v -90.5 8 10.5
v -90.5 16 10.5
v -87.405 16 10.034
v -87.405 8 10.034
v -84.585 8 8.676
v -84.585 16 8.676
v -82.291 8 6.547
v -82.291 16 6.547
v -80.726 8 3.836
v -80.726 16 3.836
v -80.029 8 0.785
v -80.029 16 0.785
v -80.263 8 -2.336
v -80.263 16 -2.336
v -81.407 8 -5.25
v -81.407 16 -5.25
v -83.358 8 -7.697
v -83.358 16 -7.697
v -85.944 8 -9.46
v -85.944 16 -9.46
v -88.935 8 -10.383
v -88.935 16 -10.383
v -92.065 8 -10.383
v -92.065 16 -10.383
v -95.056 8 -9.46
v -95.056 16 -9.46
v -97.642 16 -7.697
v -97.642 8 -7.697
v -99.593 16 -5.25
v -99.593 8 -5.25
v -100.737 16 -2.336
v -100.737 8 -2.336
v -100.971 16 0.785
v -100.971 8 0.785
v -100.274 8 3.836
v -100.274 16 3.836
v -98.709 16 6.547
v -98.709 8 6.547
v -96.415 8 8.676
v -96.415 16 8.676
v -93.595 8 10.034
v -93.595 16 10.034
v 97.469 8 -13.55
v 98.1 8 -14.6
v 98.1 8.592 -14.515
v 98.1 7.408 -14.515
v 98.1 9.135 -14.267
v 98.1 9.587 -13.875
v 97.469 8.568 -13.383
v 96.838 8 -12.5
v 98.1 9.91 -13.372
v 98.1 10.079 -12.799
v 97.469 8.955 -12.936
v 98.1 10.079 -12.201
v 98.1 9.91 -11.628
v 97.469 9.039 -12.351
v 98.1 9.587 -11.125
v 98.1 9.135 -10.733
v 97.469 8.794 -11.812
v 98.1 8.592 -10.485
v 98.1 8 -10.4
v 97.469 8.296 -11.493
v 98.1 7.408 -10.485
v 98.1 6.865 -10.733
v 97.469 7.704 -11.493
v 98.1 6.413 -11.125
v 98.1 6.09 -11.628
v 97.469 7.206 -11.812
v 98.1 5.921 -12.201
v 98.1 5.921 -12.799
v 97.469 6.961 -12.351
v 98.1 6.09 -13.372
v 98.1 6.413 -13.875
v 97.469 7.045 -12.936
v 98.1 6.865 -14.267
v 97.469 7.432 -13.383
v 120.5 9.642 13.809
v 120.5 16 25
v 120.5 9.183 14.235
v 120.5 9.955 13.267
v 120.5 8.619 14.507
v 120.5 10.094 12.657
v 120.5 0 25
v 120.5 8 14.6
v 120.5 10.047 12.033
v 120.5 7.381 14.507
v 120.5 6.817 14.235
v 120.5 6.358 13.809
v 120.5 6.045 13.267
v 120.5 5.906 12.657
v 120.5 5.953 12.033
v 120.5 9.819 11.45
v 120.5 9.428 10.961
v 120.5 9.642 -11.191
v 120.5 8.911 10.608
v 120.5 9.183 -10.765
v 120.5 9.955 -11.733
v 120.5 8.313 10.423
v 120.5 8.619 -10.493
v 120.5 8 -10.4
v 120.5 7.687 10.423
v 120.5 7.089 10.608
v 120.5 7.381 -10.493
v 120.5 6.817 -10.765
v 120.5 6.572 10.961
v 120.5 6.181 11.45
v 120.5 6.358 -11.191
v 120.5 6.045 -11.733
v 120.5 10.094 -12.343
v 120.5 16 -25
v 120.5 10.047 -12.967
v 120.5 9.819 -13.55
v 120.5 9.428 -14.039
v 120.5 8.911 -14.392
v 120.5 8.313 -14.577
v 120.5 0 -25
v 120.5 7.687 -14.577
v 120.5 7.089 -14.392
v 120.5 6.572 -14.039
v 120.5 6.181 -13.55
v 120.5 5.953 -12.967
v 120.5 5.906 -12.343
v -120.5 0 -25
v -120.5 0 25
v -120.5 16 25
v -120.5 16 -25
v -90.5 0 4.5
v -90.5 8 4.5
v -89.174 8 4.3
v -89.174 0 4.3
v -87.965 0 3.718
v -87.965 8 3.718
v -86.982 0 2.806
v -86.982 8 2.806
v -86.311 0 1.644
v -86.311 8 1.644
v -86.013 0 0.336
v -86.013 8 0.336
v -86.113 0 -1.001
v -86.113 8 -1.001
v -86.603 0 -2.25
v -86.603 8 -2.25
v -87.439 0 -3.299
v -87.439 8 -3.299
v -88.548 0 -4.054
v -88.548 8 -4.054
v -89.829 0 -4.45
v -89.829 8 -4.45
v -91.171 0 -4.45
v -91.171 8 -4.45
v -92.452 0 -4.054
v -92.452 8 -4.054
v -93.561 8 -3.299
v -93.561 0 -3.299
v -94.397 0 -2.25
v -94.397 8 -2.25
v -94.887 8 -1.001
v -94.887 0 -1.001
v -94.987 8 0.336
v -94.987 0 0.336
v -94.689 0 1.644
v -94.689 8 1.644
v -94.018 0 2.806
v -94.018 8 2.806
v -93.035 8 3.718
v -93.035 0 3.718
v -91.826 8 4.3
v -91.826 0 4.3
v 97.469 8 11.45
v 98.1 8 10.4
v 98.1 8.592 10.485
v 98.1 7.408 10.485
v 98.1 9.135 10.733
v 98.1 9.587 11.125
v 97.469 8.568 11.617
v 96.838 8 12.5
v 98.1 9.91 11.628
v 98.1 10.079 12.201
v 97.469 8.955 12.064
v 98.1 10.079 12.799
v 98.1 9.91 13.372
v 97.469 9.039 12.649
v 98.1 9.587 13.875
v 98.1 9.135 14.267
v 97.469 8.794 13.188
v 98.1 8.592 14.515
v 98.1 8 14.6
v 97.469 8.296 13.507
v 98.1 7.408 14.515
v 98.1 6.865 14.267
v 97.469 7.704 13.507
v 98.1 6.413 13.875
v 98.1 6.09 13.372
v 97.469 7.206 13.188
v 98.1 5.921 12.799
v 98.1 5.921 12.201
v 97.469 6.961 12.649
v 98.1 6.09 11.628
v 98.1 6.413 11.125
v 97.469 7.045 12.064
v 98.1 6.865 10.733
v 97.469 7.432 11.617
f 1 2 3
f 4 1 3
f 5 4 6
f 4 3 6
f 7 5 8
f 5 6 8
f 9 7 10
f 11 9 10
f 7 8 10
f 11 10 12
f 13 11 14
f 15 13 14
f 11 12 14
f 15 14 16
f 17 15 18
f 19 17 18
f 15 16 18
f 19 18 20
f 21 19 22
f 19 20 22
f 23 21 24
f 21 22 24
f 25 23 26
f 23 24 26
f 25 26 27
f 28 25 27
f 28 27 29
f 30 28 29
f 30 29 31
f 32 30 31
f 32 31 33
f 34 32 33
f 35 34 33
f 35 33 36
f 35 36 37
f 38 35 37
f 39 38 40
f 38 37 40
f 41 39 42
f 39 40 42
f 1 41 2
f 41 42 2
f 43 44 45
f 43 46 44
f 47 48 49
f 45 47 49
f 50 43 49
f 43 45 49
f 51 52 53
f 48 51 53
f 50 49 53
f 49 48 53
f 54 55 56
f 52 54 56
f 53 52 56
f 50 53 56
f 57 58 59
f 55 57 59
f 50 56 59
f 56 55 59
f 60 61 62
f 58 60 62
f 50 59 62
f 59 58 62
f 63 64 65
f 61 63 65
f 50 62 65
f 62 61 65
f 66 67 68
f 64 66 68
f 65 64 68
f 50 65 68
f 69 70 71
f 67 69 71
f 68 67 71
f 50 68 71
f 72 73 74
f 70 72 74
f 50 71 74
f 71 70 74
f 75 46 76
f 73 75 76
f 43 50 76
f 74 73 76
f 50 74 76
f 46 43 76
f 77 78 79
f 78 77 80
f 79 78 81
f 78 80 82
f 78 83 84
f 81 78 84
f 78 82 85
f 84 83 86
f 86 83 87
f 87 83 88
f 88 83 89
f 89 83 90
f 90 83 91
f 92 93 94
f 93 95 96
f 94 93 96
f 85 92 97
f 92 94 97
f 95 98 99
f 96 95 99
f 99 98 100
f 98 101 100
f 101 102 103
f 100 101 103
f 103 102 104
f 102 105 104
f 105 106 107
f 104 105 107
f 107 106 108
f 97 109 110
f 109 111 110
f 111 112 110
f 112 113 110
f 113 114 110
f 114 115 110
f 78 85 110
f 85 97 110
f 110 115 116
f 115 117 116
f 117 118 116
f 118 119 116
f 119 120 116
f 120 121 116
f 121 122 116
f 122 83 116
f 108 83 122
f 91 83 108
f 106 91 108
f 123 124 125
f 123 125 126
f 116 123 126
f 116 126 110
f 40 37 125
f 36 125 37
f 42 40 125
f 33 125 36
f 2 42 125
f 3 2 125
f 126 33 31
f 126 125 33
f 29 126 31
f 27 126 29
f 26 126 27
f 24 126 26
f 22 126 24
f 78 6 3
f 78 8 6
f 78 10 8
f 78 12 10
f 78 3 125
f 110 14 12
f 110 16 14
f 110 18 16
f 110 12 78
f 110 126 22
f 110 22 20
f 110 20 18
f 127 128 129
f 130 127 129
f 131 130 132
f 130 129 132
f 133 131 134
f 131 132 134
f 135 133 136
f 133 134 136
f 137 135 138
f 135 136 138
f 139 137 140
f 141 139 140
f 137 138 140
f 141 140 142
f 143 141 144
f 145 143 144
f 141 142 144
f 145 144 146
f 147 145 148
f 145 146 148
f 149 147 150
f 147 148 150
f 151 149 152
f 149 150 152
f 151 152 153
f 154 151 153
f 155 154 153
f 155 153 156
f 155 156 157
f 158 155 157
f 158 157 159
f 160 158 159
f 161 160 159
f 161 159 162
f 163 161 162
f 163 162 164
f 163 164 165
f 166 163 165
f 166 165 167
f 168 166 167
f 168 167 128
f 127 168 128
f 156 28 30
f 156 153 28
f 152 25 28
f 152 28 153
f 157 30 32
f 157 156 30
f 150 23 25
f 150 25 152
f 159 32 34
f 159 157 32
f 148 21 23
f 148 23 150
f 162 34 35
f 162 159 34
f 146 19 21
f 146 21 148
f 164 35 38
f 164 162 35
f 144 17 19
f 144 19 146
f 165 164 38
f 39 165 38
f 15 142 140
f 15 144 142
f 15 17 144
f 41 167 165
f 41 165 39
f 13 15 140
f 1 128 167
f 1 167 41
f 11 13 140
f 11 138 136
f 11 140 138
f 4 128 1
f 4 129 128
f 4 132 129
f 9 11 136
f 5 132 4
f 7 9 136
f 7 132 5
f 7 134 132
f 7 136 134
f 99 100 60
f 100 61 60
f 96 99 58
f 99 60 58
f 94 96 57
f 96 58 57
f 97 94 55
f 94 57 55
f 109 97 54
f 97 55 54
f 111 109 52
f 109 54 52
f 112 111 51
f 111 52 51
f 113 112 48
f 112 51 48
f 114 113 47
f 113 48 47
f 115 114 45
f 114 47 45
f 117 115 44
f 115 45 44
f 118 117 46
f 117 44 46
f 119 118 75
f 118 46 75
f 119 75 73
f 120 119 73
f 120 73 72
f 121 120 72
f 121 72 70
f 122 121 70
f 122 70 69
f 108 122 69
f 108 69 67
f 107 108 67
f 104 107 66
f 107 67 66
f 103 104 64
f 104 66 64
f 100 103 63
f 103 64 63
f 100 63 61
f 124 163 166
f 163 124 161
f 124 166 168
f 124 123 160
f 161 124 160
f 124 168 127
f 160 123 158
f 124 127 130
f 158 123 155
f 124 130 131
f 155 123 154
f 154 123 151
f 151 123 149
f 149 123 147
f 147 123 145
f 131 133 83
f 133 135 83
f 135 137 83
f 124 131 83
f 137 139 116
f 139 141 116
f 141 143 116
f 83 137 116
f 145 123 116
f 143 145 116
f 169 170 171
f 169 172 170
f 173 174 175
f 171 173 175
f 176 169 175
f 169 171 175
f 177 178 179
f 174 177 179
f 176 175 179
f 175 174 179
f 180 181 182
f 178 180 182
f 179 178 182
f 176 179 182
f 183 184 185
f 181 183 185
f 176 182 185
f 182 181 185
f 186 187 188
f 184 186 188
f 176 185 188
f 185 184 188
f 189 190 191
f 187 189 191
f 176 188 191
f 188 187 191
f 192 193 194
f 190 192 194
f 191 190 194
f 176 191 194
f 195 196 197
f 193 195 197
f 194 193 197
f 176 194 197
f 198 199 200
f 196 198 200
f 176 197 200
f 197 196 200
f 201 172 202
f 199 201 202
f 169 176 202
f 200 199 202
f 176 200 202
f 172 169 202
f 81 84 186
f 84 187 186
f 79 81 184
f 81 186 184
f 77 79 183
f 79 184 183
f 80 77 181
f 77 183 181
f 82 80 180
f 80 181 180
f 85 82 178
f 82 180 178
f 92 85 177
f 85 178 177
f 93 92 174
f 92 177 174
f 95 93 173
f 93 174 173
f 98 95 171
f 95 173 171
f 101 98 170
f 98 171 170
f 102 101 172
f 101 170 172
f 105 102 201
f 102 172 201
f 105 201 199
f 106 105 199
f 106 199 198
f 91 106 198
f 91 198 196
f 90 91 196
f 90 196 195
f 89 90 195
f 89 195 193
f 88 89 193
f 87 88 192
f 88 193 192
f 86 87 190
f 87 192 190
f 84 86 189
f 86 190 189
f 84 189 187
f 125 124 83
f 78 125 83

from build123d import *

# Parameters (mm, degrees)
SKETCH2_W             = 241
SKETCH2_H             = 50
BOSS_EXTRUDE1_DEPTH   = 16
SKETCH3_R             = 10.5
CUT_EXTRUDE1_DEPTH    = 8
SKETCH6_R             = 4.5
CUT_EXTRUDE2_DEPTH    = 124.325788057
M5_TAPPED_HOLE4_D     = 4.2
M5_TAPPED_HOLE4_DEPTH = 22.4
M5_TAPPED_HOLE4_TIP   = 1.2618073


with BuildPart() as part:
    # Sketch2 → Boss-Extrude1 (new body)
    with BuildSketch(Plane(origin=(0, 0, 0), x_dir=(1, 0, 0), z_dir=(0, 1, 0))):
        Rectangle(SKETCH2_W, SKETCH2_H)
    extrude(amount=BOSS_EXTRUDE1_DEPTH)

    # Sketch3 → Cut-Extrude1 (cut)
    with BuildSketch(Plane(origin=(0, 16, 0), x_dir=(1, 0, 0), z_dir=(0, 1, 0))):
        with Locations(Location((-90.5, 0, 0), (0, 0, 270))):
            Circle(SKETCH3_R)
    extrude(amount=-CUT_EXTRUDE1_DEPTH, mode=Mode.SUBTRACT)

    # Sketch6 → Cut-Extrude2 (cut, through all)
    with BuildSketch(Plane(origin=(0, 8, 0), x_dir=(1, 0, 0), z_dir=(0, 1, 0))):
        with Locations(Location((-90.5, 0, 0), (0, 0, 270))):
            Circle(SKETCH6_R)
    extrude(amount=-CUT_EXTRUDE2_DEPTH, mode=Mode.SUBTRACT)

    # M5 Tapped Hole4
    with Locations(Plane(origin=(120.5, 0, 0), x_dir=(0, 0, -1), z_dir=(1, 0, 0))):
        with Locations((-12.5, 8), (12.5, 8)):
            Hole(M5_TAPPED_HOLE4_D / 2, depth=M5_TAPPED_HOLE4_DEPTH)
            with Locations((0, 0, -(M5_TAPPED_HOLE4_DEPTH + M5_TAPPED_HOLE4_TIP / 2))):  # 118° drill point
                Cone(0, M5_TAPPED_HOLE4_D / 2, M5_TAPPED_HOLE4_TIP, mode=Mode.SUBTRACT)


solid = part.part
